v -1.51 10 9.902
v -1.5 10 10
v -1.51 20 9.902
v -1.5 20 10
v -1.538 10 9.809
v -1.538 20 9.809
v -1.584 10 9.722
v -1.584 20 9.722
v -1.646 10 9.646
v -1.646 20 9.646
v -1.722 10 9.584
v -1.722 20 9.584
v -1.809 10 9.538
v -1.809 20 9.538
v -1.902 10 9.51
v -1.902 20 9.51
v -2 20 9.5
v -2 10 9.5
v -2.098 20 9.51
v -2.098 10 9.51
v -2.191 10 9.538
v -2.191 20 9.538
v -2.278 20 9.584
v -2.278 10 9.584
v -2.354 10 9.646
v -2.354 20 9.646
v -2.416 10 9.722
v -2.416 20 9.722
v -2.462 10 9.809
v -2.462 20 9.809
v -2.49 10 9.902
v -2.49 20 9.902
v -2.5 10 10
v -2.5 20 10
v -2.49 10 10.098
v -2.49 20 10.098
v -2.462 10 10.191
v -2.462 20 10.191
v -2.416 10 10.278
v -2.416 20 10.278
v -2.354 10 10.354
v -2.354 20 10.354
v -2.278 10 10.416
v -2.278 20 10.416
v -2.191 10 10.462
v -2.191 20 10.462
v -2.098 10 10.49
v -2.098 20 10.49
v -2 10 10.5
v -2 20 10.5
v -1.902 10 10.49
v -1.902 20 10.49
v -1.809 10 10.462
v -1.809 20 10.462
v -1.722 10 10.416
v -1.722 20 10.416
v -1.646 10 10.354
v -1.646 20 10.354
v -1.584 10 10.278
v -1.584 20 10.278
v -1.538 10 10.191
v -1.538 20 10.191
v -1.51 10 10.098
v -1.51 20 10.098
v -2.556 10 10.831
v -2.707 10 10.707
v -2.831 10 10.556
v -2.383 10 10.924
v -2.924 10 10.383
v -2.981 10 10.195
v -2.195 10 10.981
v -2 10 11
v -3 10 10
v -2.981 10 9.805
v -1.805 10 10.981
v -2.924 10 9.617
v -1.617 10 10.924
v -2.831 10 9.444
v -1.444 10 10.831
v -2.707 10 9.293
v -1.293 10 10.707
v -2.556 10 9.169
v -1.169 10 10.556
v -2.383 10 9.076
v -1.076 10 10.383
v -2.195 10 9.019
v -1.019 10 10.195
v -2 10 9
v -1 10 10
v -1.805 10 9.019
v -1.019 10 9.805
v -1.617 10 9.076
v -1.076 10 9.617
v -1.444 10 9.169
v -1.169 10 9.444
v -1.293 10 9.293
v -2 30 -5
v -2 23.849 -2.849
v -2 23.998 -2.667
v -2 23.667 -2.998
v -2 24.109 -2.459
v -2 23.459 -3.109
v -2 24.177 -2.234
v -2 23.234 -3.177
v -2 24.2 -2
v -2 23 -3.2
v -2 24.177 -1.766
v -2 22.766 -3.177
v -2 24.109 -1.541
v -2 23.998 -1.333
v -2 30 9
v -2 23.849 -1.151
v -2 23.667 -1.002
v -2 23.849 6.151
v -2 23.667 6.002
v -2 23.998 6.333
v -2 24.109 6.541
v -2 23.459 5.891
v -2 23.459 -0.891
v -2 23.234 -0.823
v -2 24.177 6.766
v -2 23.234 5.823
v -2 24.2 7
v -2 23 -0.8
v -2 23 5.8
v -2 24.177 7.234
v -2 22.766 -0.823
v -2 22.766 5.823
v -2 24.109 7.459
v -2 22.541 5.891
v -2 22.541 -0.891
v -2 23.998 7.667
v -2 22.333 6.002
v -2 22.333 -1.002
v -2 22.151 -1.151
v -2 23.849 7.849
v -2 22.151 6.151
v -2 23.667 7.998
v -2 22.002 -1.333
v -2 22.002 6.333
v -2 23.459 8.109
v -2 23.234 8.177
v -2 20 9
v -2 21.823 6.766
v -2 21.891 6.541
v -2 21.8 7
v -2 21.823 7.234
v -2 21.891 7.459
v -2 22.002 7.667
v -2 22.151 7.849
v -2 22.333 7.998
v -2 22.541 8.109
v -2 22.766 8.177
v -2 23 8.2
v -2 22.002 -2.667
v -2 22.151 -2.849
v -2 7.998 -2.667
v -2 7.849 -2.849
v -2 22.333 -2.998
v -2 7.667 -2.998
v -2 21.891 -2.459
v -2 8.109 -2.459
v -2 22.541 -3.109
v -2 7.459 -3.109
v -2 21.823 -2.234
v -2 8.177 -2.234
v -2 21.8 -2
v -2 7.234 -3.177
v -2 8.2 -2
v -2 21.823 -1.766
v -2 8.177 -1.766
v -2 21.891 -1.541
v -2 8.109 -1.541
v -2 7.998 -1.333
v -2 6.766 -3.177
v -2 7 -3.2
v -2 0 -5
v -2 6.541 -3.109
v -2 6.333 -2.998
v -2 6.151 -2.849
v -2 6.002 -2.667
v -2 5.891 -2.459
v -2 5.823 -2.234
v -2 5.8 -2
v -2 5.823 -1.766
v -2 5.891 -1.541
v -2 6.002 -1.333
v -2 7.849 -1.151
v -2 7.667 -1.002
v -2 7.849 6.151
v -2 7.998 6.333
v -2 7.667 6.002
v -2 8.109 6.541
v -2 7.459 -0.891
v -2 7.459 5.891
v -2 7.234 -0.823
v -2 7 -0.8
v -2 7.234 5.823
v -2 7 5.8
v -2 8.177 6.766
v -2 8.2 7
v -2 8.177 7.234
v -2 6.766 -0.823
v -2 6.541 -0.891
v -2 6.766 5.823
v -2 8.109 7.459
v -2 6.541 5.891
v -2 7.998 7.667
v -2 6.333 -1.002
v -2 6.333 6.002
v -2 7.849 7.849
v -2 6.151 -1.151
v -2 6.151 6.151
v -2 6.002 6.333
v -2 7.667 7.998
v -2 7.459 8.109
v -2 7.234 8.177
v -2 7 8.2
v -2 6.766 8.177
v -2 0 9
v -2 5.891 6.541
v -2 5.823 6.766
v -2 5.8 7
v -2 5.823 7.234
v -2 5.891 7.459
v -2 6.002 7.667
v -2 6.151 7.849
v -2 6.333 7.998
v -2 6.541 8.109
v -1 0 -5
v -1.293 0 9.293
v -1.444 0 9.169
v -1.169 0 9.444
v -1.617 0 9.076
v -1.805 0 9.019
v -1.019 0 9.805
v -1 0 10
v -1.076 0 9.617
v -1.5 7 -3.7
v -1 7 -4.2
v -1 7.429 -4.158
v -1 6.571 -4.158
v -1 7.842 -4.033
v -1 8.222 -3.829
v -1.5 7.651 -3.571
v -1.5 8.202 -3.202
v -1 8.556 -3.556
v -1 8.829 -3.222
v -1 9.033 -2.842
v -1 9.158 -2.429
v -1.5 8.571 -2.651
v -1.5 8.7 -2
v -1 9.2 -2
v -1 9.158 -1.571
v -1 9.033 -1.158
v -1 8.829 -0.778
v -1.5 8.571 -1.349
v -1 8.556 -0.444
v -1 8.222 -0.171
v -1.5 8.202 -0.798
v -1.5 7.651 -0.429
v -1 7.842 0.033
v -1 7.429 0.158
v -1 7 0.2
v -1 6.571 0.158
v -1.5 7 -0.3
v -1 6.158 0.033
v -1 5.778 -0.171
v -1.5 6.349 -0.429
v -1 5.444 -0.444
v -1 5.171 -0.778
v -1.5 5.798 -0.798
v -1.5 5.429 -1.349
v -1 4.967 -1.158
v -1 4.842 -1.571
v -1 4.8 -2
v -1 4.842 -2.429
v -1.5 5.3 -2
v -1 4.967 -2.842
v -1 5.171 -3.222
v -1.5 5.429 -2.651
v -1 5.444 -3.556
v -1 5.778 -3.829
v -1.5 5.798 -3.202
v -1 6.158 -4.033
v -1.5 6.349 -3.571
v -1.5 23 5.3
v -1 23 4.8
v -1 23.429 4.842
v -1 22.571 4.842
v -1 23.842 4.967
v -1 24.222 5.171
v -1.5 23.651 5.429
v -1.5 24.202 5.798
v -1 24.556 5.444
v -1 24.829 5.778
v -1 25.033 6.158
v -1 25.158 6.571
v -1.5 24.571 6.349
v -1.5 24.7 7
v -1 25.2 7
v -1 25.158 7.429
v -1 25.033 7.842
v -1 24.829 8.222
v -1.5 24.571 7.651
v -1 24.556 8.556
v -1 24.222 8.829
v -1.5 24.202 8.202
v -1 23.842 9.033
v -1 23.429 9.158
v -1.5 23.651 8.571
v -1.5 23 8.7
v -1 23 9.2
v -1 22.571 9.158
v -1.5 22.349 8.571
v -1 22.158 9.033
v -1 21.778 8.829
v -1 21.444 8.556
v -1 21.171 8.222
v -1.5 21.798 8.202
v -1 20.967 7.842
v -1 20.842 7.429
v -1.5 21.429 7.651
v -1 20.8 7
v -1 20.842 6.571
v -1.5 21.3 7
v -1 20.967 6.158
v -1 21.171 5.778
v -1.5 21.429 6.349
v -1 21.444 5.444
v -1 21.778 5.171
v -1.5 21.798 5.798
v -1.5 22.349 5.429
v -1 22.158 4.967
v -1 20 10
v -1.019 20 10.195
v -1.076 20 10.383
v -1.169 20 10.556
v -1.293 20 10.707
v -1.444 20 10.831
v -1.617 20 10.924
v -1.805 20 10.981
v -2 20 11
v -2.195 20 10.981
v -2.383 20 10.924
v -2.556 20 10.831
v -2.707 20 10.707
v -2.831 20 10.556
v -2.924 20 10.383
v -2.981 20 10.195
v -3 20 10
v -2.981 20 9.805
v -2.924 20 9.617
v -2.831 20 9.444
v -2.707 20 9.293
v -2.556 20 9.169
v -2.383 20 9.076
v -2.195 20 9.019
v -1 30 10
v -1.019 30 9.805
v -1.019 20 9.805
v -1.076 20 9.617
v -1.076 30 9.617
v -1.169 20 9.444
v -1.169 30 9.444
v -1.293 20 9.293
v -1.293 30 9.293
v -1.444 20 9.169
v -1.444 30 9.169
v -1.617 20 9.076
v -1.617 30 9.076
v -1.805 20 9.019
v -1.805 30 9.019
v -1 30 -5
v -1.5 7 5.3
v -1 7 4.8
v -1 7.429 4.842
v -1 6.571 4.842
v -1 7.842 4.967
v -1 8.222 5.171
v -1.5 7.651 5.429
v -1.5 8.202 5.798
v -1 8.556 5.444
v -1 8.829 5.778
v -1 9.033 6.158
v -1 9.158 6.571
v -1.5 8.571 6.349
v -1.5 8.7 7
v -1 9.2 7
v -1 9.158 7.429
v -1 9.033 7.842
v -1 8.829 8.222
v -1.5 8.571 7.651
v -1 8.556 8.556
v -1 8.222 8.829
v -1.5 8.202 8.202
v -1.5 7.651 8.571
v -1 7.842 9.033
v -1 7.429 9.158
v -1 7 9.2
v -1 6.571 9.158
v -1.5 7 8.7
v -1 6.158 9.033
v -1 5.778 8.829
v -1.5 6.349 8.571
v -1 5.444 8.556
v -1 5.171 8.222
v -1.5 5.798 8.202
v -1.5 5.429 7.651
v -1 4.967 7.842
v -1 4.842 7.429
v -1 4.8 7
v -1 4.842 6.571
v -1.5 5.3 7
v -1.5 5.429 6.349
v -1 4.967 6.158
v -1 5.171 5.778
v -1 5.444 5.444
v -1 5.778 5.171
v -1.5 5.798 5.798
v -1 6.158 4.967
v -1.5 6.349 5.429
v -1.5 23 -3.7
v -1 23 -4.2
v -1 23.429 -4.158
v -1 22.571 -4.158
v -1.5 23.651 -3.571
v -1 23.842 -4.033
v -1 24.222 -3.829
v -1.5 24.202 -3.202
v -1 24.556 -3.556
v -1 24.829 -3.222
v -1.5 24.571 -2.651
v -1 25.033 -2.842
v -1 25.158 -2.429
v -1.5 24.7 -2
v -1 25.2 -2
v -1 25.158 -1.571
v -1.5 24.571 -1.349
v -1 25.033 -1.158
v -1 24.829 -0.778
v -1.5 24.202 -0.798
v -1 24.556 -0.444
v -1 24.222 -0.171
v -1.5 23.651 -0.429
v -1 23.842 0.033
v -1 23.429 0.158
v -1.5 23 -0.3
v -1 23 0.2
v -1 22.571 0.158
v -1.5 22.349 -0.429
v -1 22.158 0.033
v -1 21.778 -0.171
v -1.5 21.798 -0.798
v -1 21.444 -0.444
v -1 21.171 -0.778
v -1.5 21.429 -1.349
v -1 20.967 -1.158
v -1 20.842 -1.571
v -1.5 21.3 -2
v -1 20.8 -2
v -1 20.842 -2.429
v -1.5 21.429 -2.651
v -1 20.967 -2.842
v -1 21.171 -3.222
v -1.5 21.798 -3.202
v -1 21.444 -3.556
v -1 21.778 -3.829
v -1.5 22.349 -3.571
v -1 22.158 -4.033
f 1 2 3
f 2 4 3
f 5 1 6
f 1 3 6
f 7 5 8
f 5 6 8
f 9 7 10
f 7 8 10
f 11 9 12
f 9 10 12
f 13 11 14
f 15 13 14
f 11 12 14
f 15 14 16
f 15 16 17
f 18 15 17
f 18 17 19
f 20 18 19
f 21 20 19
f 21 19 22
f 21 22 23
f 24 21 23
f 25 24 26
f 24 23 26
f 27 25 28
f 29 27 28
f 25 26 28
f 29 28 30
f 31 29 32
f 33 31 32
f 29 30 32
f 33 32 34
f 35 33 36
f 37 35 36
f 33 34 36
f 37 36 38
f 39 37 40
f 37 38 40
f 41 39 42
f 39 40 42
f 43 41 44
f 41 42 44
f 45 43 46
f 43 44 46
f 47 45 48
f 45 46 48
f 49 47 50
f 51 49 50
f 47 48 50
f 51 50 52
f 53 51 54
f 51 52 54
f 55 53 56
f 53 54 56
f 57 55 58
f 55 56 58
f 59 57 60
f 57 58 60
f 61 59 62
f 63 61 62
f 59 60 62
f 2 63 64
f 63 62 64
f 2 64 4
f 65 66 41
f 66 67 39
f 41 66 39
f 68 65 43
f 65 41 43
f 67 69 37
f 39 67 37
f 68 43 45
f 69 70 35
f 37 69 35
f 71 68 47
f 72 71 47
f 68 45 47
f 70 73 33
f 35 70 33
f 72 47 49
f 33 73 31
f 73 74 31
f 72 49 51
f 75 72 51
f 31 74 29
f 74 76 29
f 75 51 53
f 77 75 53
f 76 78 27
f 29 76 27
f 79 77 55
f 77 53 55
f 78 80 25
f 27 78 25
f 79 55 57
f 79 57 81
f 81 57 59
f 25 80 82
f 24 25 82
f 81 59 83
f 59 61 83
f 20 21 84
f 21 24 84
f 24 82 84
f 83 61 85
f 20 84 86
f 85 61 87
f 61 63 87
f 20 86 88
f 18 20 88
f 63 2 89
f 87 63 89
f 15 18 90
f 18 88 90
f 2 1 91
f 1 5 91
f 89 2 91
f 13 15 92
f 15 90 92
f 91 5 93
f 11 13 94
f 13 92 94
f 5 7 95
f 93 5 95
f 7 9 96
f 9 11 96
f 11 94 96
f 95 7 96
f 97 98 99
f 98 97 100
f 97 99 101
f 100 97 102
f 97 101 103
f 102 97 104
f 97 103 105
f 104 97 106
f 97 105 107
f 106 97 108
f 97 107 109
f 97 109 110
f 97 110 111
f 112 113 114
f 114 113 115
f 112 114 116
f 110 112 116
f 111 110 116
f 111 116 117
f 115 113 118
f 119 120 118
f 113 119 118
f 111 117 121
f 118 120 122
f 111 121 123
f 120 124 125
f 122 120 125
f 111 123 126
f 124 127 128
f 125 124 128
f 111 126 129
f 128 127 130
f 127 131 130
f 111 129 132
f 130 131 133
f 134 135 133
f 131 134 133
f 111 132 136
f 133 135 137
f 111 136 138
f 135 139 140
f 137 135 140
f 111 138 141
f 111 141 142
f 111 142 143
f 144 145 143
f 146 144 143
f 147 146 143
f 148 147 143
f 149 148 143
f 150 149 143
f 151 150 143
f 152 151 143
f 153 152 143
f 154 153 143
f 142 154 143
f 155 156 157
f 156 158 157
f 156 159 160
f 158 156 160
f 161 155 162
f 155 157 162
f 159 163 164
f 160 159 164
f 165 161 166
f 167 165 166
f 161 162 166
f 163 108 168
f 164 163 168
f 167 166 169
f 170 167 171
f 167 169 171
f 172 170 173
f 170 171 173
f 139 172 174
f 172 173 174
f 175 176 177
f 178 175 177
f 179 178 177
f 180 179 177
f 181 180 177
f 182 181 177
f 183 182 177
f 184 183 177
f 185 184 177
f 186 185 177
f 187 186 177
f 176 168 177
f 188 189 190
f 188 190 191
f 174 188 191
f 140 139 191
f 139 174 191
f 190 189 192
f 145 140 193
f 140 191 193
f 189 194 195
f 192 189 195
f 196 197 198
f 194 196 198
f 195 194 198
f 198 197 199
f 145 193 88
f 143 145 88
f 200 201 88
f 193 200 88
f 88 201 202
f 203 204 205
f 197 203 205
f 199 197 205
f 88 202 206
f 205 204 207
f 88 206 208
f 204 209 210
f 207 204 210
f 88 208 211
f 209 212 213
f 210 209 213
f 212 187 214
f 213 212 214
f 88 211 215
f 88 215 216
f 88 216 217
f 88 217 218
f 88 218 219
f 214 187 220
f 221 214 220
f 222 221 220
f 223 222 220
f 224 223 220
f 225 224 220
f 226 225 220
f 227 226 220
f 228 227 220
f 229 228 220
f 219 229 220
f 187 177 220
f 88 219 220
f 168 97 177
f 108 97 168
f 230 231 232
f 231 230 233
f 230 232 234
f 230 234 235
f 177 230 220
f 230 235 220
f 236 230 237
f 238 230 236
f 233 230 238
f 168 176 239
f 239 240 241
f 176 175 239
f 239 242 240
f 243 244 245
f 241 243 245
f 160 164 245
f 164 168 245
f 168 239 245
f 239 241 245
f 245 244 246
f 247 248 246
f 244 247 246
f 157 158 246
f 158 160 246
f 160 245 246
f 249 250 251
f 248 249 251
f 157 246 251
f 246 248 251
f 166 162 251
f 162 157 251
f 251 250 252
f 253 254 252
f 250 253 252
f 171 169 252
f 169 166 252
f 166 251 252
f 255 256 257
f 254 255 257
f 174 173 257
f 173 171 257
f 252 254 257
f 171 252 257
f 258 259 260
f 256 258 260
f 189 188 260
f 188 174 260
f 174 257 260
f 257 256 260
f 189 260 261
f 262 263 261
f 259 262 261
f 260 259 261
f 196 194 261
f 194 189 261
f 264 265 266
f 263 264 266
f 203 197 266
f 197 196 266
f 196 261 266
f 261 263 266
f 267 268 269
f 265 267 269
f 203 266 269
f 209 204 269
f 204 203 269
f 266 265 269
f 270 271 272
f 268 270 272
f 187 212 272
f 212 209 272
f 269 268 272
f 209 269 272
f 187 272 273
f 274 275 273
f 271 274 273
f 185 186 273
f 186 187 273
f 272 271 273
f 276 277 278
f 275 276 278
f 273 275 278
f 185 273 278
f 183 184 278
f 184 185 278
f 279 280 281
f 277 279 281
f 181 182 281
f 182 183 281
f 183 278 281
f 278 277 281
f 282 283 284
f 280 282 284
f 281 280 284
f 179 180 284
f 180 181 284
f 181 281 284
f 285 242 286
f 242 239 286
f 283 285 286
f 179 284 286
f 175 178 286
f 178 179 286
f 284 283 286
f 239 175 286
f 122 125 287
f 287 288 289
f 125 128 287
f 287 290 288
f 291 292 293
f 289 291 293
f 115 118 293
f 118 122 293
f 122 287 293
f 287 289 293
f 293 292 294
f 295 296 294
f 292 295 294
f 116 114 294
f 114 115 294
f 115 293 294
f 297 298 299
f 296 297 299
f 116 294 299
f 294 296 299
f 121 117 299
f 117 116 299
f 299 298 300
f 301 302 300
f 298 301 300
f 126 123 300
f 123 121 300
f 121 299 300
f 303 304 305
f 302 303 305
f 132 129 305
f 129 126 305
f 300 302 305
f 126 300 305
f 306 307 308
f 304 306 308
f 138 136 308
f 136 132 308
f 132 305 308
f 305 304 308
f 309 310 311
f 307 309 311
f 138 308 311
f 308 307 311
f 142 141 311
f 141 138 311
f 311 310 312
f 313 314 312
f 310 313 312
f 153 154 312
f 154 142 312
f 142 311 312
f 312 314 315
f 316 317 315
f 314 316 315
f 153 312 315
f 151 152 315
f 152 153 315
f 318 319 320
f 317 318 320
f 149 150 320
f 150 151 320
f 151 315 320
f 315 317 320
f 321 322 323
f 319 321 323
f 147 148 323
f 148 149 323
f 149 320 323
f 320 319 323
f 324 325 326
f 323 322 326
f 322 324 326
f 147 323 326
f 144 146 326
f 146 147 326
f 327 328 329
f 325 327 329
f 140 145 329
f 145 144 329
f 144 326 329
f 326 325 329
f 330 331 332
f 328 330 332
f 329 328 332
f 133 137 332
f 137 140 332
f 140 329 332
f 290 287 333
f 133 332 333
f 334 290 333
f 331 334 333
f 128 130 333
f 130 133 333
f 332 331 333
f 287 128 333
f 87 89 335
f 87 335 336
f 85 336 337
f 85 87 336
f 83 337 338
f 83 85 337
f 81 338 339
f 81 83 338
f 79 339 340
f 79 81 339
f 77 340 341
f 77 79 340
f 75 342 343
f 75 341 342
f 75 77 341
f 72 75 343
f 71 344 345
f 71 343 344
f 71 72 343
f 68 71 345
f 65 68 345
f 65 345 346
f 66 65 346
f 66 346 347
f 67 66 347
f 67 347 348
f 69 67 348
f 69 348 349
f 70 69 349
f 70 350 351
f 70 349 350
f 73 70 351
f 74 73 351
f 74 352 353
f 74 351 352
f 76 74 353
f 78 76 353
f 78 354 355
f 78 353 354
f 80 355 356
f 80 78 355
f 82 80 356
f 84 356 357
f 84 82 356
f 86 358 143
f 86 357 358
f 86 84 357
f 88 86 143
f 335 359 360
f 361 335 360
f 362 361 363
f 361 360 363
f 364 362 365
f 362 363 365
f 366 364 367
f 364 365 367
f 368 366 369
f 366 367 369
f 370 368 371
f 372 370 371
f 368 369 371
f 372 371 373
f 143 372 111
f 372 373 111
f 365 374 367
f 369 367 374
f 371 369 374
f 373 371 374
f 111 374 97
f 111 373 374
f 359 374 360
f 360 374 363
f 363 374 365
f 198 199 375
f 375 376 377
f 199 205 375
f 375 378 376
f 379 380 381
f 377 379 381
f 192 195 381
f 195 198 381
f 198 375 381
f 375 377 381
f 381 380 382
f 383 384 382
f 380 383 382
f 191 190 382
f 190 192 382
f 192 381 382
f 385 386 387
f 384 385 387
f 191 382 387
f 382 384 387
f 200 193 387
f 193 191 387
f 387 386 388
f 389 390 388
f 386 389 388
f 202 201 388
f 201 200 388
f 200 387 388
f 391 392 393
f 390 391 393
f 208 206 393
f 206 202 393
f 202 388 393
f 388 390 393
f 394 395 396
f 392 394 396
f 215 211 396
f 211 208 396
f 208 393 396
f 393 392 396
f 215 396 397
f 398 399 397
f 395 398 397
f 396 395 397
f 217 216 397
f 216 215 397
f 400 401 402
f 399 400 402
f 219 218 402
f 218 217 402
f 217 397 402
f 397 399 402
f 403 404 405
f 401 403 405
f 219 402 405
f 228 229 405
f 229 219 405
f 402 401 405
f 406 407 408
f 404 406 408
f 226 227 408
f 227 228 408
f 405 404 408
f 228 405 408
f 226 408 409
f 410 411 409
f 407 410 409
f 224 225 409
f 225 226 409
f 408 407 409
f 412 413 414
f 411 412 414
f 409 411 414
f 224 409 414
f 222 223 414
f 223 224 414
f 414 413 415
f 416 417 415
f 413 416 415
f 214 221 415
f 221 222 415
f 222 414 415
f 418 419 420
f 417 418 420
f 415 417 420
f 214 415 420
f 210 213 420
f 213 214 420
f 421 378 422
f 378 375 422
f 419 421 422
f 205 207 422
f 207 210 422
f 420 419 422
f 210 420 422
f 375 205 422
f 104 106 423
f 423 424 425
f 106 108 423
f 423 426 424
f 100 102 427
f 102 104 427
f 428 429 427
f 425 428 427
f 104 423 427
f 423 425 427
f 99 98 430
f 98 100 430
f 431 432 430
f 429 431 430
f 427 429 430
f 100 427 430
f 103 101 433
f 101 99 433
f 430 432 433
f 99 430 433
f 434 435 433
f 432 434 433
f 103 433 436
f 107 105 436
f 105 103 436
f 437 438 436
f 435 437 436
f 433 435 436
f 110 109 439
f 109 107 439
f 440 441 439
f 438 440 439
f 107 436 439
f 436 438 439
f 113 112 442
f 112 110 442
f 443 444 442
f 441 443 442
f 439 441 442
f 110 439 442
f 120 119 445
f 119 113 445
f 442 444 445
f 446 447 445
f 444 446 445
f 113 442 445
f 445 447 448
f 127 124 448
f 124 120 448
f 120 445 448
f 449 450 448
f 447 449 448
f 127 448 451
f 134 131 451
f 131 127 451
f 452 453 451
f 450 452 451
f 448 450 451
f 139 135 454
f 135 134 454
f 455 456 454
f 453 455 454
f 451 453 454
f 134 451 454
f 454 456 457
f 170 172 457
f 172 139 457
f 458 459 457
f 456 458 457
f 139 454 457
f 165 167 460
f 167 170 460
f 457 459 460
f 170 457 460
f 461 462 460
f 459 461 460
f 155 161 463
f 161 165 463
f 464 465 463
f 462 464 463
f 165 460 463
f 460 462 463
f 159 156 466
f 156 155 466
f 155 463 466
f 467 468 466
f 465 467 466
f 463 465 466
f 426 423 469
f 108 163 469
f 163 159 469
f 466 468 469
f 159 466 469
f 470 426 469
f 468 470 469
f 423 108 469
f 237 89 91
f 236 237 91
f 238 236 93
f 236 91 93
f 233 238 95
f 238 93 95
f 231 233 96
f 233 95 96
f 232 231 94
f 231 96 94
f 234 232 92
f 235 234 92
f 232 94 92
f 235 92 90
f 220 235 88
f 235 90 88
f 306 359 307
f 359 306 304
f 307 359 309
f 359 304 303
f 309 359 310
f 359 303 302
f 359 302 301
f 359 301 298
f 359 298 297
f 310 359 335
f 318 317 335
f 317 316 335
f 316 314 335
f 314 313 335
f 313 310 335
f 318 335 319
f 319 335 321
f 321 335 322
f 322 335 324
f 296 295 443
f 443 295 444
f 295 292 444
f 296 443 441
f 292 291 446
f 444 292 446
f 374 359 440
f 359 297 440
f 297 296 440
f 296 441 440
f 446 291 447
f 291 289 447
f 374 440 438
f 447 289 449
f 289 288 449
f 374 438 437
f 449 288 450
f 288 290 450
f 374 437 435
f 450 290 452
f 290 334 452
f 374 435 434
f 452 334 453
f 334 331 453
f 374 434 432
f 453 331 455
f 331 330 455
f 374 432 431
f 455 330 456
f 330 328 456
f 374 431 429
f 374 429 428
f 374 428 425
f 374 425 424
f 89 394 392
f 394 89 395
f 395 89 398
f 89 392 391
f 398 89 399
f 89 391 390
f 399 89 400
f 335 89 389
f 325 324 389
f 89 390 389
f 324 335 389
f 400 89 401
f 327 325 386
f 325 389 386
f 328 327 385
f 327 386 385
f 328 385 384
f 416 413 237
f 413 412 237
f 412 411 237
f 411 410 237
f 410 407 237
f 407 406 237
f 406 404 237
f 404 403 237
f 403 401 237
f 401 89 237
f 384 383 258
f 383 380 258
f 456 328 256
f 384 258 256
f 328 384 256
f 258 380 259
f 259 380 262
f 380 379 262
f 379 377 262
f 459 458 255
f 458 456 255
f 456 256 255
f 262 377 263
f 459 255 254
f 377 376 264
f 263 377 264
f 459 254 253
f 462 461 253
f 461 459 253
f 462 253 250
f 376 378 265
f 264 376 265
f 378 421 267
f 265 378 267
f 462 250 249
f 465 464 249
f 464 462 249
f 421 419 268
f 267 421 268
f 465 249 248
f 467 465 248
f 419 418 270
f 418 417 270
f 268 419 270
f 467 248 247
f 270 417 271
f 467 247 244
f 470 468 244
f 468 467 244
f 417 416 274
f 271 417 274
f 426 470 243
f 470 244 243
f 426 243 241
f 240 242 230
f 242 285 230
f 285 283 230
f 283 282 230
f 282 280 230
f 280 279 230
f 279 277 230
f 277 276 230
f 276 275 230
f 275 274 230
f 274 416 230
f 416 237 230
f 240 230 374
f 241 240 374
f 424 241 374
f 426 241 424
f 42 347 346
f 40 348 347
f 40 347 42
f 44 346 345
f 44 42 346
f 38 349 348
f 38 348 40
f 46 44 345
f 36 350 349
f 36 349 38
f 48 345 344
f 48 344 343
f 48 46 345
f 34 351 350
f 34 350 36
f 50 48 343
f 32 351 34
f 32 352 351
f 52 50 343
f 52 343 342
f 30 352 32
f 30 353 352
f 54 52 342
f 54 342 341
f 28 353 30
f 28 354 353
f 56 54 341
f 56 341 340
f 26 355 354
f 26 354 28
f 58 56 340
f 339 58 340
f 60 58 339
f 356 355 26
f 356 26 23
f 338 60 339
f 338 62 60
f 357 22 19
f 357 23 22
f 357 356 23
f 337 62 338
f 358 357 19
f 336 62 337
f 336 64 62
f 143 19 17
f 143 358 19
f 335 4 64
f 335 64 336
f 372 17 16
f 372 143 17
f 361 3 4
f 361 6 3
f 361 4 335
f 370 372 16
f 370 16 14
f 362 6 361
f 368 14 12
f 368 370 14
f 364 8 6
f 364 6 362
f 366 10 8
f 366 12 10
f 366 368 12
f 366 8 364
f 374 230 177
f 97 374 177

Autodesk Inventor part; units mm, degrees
ref_plane "YZ Plane" through (0, 0, 0) normal (1, 0, 0) x (0, 1, 0)
ref_plane "XZ Plane" through (0, 0, 0) normal (0, 1, 0) x (-1, 0, 0)
ref_plane "XY Plane" through (0, 0, 0) normal (0, 0, 1) x (1, 0, 0)
sketch "Szkic1" plane through (0, 0, 0) normal (0, 1, 0) x (-1, 0, 0)
  line L0 (2, 10) -> (1, 10)
  line L1 (1, 10) -> (1, -5)
  line L2 (1, -5) -> (2, -5)
  line L3 (2, -5) -> (2, 10)
  circle A0 centre (2, 10) radius 1
  point P0 (0, 0)
  point P1 (2, 9)
extrude "Wyciągnięcie proste1" add sketch "Szkic1" along normal blind 30
sketch "Szkic2" plane through (0, 30, 0) normal (0, 1, 0) x (1, 0, 0)
  circle A0 centre (-2, -10) radius 0.5
  point P0 (0, 0)
  dimension "d5" = 1
extrude "Wyciągnięcie proste2" cut sketch "Szkic2" against normal blind 30
sketch "Szkic3" plane through (0, 30, 0) normal (0, 1, 0) x (1, 0, 0)
  circle A0 centre (-2, -10) radius 0.5 projected
  circle A1 centre (-2, -10) radius 1
  point P0 (0, 0)
  dimension "d8" = 2
extrude "Wyciągnięcie proste3" cut sketch "Szkic3" against normal blind 10
pattern_linear "Szyk prostokątny1" count 2 spacing 20 along (0, -1, 0) of "Wyciągnięcie proste3"
sketch "Szkic9" plane through (-1, 0, -5) normal (1, 0, 0) x (0, 0, -1)
  point P0 (-3, 7)
hole "Otwór6" at (-1, 7, -2) direction (-1, 0, 0) diameter 2.4 end through all countersink diameter 4.4 countersink angle 90
sketch "Szkic10" plane through (-1, 0, -5) normal (1, 0, 0) x (0, 0, -1)
  point P0 (-12, 7)
hole "Otwór7" at (-1, 7, 7) direction (-1, 0, 0) diameter 2.4 end through all countersink diameter 4.4 countersink angle 90
sketch "Szkic11" plane through (-1, 0, -5) normal (1, 0, 0) x (0, 0, -1)
  point P0 (-12, 23)
hole "Otwór8" at (-1, 23, 7) direction (-1, 0, 0) diameter 2.4 end through all countersink diameter 4.4 countersink angle 90
sketch "Szkic12" plane through (-1, 0, -5) normal (1, 0, 0) x (0, 0, -1)
  point P0 (-3, 23)
hole "Otwór9" at (-1, 23, -2) direction (-1, 0, 0) diameter 2.4 end through all countersink diameter 4.4 countersink angle 90
properties part number "hinge 1"
